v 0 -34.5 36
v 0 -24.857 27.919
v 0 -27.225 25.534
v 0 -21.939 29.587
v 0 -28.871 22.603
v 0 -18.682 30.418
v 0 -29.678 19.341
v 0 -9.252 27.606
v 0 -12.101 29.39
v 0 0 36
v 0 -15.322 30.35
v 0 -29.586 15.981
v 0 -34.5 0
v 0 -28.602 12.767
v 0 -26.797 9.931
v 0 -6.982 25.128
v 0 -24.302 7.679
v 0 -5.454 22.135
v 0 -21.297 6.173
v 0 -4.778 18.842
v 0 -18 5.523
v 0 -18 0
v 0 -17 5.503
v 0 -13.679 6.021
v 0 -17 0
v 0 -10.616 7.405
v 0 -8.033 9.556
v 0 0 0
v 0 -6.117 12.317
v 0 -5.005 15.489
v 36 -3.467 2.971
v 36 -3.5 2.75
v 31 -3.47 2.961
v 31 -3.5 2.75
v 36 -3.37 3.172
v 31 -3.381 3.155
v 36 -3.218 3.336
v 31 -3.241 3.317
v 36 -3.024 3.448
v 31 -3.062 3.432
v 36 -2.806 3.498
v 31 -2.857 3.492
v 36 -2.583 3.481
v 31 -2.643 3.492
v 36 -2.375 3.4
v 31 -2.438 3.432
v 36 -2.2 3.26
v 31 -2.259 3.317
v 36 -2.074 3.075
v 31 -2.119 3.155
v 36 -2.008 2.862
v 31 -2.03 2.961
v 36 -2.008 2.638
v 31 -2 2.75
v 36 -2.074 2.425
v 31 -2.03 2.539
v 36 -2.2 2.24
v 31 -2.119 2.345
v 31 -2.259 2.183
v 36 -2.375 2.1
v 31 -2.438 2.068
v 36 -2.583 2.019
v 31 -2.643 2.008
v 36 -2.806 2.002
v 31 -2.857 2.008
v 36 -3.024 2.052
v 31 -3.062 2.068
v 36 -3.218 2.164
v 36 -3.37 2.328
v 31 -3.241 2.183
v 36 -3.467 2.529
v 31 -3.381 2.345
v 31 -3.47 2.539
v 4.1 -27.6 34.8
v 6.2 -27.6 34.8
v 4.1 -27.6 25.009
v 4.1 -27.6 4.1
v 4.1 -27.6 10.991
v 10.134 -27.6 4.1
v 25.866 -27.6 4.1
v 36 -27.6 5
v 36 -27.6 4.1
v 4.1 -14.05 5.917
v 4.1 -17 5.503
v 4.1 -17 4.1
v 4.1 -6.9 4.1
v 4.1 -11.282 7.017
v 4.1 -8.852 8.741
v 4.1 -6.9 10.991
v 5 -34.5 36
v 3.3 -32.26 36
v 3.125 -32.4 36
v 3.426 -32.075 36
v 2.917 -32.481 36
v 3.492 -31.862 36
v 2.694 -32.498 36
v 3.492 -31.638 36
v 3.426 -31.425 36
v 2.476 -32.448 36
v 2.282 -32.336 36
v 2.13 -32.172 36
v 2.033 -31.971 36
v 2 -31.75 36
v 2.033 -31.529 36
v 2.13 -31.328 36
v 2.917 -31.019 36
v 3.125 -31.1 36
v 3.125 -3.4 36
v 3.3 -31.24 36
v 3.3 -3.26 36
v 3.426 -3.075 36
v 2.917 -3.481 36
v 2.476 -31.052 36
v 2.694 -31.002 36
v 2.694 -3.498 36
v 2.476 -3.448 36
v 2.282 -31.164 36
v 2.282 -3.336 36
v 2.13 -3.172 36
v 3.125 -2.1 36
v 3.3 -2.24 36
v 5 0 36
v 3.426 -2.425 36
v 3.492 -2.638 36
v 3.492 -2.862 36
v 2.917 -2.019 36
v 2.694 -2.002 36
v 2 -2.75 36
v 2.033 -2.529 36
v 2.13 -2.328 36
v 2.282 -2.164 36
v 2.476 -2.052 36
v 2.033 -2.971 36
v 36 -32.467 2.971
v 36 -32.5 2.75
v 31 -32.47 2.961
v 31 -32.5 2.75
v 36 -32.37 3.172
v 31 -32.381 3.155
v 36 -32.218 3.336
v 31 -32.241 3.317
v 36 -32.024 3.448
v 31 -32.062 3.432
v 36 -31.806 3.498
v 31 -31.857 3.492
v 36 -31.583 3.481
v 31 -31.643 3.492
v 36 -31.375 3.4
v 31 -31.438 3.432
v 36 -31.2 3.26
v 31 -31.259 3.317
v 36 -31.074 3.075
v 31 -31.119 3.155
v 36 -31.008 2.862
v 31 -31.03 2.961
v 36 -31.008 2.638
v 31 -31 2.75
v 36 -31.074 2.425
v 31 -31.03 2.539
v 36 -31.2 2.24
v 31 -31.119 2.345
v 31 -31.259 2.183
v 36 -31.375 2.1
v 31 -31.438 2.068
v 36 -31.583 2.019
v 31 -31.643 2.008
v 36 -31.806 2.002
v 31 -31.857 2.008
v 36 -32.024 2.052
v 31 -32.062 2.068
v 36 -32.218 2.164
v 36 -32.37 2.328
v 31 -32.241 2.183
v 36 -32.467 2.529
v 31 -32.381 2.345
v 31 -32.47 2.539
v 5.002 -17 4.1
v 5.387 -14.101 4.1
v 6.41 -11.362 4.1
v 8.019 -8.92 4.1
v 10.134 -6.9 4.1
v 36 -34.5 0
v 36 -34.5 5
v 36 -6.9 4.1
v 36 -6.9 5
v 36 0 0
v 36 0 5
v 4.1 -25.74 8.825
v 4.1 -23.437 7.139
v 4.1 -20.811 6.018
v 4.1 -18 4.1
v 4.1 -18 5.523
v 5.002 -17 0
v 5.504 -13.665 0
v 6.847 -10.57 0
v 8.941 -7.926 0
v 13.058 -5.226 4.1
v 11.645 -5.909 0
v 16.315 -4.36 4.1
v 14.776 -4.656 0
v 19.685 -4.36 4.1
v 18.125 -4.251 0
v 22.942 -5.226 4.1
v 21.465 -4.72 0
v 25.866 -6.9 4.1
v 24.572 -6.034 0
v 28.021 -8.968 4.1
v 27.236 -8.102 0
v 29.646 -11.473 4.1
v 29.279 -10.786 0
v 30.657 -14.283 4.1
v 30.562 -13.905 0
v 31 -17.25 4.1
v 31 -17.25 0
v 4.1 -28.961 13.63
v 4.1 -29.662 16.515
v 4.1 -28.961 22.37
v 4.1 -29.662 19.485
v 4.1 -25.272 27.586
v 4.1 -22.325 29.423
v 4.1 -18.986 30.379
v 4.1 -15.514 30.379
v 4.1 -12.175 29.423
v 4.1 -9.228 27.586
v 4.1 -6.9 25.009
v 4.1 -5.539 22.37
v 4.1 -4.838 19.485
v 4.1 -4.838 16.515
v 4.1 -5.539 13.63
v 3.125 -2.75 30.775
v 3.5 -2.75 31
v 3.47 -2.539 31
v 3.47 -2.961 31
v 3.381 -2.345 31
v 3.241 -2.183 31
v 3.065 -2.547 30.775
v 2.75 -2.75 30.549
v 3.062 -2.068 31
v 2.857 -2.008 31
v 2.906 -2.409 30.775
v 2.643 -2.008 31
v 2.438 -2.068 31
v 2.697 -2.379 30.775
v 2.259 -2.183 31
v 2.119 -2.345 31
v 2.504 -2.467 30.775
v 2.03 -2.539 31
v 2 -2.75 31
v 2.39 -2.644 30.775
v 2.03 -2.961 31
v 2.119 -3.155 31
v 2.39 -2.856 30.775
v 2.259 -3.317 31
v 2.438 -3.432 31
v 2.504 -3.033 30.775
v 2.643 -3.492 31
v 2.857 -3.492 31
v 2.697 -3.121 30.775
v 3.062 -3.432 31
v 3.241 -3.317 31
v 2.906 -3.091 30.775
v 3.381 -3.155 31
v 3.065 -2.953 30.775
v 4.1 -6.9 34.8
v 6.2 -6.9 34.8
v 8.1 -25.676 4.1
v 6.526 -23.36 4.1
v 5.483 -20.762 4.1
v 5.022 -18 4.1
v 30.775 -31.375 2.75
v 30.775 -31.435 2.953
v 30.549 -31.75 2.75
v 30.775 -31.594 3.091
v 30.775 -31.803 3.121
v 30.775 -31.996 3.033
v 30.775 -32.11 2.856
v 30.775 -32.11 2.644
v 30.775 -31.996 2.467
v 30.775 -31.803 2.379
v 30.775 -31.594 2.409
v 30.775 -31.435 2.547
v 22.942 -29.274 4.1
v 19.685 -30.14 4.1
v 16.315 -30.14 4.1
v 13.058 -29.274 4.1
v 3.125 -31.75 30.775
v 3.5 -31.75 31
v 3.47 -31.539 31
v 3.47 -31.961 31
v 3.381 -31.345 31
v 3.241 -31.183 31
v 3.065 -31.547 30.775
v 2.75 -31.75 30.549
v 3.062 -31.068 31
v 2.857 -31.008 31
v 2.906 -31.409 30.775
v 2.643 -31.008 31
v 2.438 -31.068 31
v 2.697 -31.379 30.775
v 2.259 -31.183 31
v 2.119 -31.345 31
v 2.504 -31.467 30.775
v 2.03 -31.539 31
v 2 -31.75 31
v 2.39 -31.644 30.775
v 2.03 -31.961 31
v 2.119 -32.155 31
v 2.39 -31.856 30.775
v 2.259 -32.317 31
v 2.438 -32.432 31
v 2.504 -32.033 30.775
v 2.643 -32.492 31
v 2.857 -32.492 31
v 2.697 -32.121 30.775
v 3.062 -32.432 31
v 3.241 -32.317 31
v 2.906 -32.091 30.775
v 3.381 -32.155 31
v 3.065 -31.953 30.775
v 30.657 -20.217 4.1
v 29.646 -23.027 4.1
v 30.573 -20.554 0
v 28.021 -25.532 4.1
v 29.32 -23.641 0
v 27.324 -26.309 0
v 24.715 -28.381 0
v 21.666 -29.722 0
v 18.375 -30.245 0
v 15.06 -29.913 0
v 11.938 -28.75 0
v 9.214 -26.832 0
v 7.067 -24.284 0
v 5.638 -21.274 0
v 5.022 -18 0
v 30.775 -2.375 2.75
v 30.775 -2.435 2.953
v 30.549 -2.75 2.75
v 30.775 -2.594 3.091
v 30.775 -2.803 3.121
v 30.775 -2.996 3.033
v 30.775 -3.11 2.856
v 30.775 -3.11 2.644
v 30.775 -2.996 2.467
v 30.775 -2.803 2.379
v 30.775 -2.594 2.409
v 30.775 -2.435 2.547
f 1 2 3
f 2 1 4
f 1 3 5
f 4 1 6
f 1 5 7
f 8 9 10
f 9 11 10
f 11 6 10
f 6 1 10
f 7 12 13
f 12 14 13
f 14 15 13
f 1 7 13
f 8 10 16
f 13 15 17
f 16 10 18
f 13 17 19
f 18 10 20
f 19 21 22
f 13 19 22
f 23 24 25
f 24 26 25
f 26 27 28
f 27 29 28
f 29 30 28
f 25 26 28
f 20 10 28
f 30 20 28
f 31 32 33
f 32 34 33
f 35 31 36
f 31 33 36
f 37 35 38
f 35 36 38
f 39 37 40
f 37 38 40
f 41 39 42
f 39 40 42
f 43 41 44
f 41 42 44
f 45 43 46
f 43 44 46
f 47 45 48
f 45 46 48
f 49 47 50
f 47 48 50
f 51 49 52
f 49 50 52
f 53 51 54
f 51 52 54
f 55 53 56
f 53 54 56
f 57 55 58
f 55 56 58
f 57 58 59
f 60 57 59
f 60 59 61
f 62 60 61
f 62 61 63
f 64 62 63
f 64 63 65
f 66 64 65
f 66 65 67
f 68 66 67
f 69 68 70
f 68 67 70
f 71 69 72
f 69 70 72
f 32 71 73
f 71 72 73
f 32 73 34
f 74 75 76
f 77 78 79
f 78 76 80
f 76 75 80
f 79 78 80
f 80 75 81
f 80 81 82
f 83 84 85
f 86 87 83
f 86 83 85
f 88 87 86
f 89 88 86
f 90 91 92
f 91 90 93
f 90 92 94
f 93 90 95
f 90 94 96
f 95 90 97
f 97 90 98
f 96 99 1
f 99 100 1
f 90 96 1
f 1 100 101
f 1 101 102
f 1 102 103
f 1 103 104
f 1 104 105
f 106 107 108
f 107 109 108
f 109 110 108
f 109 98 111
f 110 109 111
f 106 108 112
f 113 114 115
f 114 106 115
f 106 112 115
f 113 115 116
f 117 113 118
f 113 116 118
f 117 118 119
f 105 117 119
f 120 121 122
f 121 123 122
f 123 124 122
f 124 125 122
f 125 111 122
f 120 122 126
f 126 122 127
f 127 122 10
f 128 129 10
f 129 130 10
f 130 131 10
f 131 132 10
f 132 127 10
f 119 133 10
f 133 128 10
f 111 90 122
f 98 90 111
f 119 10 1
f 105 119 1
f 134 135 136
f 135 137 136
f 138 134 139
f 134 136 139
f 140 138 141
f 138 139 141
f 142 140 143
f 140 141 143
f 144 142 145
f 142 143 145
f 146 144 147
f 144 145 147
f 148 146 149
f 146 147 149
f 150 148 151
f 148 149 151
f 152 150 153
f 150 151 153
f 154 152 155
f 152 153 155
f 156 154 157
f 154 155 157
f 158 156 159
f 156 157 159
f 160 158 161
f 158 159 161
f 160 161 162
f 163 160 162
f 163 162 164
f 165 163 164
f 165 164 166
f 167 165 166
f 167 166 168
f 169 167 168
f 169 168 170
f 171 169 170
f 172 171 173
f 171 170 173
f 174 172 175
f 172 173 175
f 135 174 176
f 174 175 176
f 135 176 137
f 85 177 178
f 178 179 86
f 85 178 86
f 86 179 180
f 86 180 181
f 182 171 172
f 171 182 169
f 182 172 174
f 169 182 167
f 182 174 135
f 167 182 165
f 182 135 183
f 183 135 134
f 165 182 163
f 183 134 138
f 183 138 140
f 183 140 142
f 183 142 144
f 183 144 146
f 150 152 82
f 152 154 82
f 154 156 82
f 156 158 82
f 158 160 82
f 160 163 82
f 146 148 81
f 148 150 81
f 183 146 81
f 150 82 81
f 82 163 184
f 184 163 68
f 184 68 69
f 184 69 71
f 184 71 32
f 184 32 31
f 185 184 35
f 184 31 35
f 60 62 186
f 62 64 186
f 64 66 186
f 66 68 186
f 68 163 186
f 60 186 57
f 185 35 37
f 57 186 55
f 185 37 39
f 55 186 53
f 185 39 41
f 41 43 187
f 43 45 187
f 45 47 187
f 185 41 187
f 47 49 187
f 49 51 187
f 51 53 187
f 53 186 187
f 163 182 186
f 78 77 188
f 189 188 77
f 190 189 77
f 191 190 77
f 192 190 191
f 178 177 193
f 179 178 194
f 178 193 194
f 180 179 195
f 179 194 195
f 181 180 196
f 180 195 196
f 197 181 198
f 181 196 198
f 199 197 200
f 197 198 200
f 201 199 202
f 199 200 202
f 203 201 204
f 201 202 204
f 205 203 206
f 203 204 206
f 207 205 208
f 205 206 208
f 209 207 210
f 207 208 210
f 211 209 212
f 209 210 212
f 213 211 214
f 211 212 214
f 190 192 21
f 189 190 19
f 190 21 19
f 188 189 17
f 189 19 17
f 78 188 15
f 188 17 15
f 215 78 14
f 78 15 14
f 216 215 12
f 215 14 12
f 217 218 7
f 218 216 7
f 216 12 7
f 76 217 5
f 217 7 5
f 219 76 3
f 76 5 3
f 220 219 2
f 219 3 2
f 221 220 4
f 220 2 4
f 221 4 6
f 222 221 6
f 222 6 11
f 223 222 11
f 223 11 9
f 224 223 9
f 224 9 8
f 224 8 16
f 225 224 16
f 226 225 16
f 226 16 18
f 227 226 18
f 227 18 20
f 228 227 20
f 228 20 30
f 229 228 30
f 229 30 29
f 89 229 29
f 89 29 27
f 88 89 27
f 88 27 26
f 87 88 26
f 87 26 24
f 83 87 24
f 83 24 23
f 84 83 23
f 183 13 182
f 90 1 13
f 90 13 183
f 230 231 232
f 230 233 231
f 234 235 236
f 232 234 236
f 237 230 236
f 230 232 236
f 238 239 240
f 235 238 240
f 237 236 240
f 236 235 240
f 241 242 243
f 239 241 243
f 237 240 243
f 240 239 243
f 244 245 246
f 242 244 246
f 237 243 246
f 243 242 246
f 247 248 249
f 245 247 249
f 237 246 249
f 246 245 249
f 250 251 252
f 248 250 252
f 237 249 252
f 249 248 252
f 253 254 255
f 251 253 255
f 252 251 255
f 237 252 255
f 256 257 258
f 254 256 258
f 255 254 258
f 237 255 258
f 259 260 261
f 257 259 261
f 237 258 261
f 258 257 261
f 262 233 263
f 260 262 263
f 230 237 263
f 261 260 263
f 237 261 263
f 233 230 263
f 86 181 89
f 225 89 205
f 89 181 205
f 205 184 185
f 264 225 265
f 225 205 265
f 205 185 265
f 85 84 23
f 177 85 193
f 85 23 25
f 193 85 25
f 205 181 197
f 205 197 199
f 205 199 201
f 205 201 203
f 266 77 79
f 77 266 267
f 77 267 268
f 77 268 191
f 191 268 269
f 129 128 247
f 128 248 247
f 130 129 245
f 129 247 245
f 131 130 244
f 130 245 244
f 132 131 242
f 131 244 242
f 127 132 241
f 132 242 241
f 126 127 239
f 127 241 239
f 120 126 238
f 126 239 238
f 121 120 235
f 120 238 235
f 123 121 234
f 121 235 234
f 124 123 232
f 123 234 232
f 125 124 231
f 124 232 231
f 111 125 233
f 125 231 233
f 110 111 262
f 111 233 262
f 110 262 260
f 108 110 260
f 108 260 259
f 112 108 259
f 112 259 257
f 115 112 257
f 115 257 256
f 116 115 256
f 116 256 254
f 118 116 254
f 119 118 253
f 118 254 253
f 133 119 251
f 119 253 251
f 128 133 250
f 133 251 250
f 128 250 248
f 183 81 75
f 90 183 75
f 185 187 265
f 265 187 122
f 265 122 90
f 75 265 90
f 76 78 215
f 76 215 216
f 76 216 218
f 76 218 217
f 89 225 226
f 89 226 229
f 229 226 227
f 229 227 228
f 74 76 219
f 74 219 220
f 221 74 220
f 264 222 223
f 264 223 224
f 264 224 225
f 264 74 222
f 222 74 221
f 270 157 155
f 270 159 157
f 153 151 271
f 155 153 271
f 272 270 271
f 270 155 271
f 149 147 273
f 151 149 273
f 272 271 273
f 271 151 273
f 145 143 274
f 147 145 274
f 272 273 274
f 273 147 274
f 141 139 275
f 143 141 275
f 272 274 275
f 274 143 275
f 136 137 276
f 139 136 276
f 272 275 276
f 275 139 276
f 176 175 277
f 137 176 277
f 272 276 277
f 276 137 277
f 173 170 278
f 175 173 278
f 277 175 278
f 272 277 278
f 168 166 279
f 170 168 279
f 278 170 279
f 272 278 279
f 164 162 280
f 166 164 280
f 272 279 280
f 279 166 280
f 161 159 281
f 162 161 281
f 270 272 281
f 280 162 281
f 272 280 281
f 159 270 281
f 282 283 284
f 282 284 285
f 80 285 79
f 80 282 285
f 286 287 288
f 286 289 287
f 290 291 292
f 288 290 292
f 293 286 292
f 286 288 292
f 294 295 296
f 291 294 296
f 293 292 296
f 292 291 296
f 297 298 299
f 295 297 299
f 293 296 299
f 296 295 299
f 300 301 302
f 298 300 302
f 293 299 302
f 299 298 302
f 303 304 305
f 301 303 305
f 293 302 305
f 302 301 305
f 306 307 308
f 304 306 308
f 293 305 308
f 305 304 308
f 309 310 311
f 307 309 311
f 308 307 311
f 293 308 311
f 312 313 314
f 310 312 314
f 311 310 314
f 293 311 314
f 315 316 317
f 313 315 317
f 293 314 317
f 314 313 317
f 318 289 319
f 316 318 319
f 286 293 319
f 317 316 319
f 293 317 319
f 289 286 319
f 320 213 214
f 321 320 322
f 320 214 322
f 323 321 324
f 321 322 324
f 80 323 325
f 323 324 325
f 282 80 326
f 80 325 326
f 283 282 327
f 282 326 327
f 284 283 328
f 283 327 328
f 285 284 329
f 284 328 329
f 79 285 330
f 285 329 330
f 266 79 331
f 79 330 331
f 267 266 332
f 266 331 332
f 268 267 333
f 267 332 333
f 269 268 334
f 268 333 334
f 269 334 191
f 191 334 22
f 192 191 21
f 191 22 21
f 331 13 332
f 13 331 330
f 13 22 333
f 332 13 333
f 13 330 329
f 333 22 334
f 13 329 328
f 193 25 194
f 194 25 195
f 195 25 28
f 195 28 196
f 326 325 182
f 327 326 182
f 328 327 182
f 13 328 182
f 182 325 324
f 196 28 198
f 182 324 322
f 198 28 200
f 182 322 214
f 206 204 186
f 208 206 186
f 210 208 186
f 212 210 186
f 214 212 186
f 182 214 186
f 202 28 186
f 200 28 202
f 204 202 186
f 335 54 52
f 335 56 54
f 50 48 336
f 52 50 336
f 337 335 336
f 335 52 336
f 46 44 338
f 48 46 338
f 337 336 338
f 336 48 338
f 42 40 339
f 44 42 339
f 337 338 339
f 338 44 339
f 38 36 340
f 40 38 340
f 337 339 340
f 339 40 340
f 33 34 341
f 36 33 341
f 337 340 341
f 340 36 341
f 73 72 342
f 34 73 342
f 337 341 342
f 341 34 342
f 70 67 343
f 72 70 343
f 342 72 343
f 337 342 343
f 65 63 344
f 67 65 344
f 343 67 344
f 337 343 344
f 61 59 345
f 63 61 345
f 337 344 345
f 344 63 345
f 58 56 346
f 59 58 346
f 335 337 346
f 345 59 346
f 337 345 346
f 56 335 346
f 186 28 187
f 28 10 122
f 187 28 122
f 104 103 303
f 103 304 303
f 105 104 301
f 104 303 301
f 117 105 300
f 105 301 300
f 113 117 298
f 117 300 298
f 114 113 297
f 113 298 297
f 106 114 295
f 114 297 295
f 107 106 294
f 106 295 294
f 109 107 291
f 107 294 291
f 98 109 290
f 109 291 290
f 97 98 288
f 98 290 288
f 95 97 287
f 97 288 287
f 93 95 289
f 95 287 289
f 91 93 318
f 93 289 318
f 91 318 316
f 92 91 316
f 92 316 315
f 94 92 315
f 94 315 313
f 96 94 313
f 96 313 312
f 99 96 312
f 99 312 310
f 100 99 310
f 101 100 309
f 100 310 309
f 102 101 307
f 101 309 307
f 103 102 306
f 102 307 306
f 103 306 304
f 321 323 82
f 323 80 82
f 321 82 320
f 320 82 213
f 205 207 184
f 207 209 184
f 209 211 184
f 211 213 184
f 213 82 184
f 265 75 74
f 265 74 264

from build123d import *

# Parameters (mm, degrees)
F1_DEPTH        = 34.5
F2_R            = 12.5
F3_DEPTH        = 4.1
F4_R            = 13
F5_DEPTH        = 4.1
F6_W            = 20.7
F6_H            = 29.8
F6_H_2          = 0.9
F7_DEPTH        = 31.9
F10_D           = 1.5
F10_DEPTH       = 5
F10_TIP         = 0.4506454643
F10_ON_F9_D     = 1.5
F10_ON_F9_DEPTH = 5
F10_ON_F9_TIP   = 0.4506454643
F12_DEPTH       = 25


with BuildPart() as f1:
    # F0 (on Front) → F1 (new body)
    with BuildSketch(Plane.XZ):
        Polygon((0, 36), (0, 0), (36, 0), (36, 5), (5, 36), align=None)
    extrude(amount=F1_DEPTH)

    # F2 (on face) → F3 (cut)
    with BuildSketch(Plane(origin=(0, 0, 0), x_dir=(0, -1, 0), z_dir=(-1, 0, 0))):
        with Locations((17.25, 18)):
            Circle(F2_R)
    extrude(amount=-F3_DEPTH, mode=Mode.SUBTRACT)

    # F4 (on face) → F5 (cut)
    with BuildSketch(Plane(origin=(0, 0, 0), x_dir=(1, 0, 0), z_dir=(0, 0, -1))):
        with Locations((18, 17.25)):
            Circle(F4_R)
    extrude(amount=-F5_DEPTH, mode=Mode.SUBTRACT)

    # F6 (on face) → F7 (cut)
    with BuildSketch(Plane.YZ.offset(36)):
        with Locations((-17.25, 19.9)):
            Rectangle(F6_W, F6_H)
        with Locations((-17.25, 4.55)):
            Rectangle(F6_W, F6_H_2)
    extrude(amount=-F7_DEPTH, mode=Mode.SUBTRACT)

    # F10
    with Locations(Plane.XY.offset(36)):
        with Locations((2.75, -31.75), (2.75, -2.75)):
            Hole(F10_D / 2, depth=F10_DEPTH)
            with Locations((0, 0, -(F10_DEPTH + F10_TIP / 2))):  # 118° drill point
                Cone(0, F10_D / 2, F10_TIP, mode=Mode.SUBTRACT)

    # F10 on F9
    with Locations(Plane.YZ.offset(36)):
        with Locations((-31.75, 2.75), (-2.75, 2.75)):
            Hole(F10_ON_F9_D / 2, depth=F10_ON_F9_DEPTH)
            with Locations((0, 0, -(F10_ON_F9_DEPTH + F10_ON_F9_TIP / 2))):  # 118° drill point
                Cone(0, F10_ON_F9_D / 2, F10_ON_F9_TIP, mode=Mode.SUBTRACT)

    # F11 (on face) → F12 (cut)
    with BuildSketch(Plane(origin=(0, 0, 0), x_dir=(0, -1, 0), z_dir=(-1, 0, 0))):
        with BuildLine():
            ThreePointArc((18, 5.5225202865), (17.5002003207, 5.5025042589), (17, 5.5025002501))
            Line((17, 5.5025002501), (17, 0))
            Line((17, 0), (18, 0))
            Line((18, 0), (18, 5.5225202865))
        make_face()
    extrude(amount=-F12_DEPTH, mode=Mode.SUBTRACT)


solid = f1.part
